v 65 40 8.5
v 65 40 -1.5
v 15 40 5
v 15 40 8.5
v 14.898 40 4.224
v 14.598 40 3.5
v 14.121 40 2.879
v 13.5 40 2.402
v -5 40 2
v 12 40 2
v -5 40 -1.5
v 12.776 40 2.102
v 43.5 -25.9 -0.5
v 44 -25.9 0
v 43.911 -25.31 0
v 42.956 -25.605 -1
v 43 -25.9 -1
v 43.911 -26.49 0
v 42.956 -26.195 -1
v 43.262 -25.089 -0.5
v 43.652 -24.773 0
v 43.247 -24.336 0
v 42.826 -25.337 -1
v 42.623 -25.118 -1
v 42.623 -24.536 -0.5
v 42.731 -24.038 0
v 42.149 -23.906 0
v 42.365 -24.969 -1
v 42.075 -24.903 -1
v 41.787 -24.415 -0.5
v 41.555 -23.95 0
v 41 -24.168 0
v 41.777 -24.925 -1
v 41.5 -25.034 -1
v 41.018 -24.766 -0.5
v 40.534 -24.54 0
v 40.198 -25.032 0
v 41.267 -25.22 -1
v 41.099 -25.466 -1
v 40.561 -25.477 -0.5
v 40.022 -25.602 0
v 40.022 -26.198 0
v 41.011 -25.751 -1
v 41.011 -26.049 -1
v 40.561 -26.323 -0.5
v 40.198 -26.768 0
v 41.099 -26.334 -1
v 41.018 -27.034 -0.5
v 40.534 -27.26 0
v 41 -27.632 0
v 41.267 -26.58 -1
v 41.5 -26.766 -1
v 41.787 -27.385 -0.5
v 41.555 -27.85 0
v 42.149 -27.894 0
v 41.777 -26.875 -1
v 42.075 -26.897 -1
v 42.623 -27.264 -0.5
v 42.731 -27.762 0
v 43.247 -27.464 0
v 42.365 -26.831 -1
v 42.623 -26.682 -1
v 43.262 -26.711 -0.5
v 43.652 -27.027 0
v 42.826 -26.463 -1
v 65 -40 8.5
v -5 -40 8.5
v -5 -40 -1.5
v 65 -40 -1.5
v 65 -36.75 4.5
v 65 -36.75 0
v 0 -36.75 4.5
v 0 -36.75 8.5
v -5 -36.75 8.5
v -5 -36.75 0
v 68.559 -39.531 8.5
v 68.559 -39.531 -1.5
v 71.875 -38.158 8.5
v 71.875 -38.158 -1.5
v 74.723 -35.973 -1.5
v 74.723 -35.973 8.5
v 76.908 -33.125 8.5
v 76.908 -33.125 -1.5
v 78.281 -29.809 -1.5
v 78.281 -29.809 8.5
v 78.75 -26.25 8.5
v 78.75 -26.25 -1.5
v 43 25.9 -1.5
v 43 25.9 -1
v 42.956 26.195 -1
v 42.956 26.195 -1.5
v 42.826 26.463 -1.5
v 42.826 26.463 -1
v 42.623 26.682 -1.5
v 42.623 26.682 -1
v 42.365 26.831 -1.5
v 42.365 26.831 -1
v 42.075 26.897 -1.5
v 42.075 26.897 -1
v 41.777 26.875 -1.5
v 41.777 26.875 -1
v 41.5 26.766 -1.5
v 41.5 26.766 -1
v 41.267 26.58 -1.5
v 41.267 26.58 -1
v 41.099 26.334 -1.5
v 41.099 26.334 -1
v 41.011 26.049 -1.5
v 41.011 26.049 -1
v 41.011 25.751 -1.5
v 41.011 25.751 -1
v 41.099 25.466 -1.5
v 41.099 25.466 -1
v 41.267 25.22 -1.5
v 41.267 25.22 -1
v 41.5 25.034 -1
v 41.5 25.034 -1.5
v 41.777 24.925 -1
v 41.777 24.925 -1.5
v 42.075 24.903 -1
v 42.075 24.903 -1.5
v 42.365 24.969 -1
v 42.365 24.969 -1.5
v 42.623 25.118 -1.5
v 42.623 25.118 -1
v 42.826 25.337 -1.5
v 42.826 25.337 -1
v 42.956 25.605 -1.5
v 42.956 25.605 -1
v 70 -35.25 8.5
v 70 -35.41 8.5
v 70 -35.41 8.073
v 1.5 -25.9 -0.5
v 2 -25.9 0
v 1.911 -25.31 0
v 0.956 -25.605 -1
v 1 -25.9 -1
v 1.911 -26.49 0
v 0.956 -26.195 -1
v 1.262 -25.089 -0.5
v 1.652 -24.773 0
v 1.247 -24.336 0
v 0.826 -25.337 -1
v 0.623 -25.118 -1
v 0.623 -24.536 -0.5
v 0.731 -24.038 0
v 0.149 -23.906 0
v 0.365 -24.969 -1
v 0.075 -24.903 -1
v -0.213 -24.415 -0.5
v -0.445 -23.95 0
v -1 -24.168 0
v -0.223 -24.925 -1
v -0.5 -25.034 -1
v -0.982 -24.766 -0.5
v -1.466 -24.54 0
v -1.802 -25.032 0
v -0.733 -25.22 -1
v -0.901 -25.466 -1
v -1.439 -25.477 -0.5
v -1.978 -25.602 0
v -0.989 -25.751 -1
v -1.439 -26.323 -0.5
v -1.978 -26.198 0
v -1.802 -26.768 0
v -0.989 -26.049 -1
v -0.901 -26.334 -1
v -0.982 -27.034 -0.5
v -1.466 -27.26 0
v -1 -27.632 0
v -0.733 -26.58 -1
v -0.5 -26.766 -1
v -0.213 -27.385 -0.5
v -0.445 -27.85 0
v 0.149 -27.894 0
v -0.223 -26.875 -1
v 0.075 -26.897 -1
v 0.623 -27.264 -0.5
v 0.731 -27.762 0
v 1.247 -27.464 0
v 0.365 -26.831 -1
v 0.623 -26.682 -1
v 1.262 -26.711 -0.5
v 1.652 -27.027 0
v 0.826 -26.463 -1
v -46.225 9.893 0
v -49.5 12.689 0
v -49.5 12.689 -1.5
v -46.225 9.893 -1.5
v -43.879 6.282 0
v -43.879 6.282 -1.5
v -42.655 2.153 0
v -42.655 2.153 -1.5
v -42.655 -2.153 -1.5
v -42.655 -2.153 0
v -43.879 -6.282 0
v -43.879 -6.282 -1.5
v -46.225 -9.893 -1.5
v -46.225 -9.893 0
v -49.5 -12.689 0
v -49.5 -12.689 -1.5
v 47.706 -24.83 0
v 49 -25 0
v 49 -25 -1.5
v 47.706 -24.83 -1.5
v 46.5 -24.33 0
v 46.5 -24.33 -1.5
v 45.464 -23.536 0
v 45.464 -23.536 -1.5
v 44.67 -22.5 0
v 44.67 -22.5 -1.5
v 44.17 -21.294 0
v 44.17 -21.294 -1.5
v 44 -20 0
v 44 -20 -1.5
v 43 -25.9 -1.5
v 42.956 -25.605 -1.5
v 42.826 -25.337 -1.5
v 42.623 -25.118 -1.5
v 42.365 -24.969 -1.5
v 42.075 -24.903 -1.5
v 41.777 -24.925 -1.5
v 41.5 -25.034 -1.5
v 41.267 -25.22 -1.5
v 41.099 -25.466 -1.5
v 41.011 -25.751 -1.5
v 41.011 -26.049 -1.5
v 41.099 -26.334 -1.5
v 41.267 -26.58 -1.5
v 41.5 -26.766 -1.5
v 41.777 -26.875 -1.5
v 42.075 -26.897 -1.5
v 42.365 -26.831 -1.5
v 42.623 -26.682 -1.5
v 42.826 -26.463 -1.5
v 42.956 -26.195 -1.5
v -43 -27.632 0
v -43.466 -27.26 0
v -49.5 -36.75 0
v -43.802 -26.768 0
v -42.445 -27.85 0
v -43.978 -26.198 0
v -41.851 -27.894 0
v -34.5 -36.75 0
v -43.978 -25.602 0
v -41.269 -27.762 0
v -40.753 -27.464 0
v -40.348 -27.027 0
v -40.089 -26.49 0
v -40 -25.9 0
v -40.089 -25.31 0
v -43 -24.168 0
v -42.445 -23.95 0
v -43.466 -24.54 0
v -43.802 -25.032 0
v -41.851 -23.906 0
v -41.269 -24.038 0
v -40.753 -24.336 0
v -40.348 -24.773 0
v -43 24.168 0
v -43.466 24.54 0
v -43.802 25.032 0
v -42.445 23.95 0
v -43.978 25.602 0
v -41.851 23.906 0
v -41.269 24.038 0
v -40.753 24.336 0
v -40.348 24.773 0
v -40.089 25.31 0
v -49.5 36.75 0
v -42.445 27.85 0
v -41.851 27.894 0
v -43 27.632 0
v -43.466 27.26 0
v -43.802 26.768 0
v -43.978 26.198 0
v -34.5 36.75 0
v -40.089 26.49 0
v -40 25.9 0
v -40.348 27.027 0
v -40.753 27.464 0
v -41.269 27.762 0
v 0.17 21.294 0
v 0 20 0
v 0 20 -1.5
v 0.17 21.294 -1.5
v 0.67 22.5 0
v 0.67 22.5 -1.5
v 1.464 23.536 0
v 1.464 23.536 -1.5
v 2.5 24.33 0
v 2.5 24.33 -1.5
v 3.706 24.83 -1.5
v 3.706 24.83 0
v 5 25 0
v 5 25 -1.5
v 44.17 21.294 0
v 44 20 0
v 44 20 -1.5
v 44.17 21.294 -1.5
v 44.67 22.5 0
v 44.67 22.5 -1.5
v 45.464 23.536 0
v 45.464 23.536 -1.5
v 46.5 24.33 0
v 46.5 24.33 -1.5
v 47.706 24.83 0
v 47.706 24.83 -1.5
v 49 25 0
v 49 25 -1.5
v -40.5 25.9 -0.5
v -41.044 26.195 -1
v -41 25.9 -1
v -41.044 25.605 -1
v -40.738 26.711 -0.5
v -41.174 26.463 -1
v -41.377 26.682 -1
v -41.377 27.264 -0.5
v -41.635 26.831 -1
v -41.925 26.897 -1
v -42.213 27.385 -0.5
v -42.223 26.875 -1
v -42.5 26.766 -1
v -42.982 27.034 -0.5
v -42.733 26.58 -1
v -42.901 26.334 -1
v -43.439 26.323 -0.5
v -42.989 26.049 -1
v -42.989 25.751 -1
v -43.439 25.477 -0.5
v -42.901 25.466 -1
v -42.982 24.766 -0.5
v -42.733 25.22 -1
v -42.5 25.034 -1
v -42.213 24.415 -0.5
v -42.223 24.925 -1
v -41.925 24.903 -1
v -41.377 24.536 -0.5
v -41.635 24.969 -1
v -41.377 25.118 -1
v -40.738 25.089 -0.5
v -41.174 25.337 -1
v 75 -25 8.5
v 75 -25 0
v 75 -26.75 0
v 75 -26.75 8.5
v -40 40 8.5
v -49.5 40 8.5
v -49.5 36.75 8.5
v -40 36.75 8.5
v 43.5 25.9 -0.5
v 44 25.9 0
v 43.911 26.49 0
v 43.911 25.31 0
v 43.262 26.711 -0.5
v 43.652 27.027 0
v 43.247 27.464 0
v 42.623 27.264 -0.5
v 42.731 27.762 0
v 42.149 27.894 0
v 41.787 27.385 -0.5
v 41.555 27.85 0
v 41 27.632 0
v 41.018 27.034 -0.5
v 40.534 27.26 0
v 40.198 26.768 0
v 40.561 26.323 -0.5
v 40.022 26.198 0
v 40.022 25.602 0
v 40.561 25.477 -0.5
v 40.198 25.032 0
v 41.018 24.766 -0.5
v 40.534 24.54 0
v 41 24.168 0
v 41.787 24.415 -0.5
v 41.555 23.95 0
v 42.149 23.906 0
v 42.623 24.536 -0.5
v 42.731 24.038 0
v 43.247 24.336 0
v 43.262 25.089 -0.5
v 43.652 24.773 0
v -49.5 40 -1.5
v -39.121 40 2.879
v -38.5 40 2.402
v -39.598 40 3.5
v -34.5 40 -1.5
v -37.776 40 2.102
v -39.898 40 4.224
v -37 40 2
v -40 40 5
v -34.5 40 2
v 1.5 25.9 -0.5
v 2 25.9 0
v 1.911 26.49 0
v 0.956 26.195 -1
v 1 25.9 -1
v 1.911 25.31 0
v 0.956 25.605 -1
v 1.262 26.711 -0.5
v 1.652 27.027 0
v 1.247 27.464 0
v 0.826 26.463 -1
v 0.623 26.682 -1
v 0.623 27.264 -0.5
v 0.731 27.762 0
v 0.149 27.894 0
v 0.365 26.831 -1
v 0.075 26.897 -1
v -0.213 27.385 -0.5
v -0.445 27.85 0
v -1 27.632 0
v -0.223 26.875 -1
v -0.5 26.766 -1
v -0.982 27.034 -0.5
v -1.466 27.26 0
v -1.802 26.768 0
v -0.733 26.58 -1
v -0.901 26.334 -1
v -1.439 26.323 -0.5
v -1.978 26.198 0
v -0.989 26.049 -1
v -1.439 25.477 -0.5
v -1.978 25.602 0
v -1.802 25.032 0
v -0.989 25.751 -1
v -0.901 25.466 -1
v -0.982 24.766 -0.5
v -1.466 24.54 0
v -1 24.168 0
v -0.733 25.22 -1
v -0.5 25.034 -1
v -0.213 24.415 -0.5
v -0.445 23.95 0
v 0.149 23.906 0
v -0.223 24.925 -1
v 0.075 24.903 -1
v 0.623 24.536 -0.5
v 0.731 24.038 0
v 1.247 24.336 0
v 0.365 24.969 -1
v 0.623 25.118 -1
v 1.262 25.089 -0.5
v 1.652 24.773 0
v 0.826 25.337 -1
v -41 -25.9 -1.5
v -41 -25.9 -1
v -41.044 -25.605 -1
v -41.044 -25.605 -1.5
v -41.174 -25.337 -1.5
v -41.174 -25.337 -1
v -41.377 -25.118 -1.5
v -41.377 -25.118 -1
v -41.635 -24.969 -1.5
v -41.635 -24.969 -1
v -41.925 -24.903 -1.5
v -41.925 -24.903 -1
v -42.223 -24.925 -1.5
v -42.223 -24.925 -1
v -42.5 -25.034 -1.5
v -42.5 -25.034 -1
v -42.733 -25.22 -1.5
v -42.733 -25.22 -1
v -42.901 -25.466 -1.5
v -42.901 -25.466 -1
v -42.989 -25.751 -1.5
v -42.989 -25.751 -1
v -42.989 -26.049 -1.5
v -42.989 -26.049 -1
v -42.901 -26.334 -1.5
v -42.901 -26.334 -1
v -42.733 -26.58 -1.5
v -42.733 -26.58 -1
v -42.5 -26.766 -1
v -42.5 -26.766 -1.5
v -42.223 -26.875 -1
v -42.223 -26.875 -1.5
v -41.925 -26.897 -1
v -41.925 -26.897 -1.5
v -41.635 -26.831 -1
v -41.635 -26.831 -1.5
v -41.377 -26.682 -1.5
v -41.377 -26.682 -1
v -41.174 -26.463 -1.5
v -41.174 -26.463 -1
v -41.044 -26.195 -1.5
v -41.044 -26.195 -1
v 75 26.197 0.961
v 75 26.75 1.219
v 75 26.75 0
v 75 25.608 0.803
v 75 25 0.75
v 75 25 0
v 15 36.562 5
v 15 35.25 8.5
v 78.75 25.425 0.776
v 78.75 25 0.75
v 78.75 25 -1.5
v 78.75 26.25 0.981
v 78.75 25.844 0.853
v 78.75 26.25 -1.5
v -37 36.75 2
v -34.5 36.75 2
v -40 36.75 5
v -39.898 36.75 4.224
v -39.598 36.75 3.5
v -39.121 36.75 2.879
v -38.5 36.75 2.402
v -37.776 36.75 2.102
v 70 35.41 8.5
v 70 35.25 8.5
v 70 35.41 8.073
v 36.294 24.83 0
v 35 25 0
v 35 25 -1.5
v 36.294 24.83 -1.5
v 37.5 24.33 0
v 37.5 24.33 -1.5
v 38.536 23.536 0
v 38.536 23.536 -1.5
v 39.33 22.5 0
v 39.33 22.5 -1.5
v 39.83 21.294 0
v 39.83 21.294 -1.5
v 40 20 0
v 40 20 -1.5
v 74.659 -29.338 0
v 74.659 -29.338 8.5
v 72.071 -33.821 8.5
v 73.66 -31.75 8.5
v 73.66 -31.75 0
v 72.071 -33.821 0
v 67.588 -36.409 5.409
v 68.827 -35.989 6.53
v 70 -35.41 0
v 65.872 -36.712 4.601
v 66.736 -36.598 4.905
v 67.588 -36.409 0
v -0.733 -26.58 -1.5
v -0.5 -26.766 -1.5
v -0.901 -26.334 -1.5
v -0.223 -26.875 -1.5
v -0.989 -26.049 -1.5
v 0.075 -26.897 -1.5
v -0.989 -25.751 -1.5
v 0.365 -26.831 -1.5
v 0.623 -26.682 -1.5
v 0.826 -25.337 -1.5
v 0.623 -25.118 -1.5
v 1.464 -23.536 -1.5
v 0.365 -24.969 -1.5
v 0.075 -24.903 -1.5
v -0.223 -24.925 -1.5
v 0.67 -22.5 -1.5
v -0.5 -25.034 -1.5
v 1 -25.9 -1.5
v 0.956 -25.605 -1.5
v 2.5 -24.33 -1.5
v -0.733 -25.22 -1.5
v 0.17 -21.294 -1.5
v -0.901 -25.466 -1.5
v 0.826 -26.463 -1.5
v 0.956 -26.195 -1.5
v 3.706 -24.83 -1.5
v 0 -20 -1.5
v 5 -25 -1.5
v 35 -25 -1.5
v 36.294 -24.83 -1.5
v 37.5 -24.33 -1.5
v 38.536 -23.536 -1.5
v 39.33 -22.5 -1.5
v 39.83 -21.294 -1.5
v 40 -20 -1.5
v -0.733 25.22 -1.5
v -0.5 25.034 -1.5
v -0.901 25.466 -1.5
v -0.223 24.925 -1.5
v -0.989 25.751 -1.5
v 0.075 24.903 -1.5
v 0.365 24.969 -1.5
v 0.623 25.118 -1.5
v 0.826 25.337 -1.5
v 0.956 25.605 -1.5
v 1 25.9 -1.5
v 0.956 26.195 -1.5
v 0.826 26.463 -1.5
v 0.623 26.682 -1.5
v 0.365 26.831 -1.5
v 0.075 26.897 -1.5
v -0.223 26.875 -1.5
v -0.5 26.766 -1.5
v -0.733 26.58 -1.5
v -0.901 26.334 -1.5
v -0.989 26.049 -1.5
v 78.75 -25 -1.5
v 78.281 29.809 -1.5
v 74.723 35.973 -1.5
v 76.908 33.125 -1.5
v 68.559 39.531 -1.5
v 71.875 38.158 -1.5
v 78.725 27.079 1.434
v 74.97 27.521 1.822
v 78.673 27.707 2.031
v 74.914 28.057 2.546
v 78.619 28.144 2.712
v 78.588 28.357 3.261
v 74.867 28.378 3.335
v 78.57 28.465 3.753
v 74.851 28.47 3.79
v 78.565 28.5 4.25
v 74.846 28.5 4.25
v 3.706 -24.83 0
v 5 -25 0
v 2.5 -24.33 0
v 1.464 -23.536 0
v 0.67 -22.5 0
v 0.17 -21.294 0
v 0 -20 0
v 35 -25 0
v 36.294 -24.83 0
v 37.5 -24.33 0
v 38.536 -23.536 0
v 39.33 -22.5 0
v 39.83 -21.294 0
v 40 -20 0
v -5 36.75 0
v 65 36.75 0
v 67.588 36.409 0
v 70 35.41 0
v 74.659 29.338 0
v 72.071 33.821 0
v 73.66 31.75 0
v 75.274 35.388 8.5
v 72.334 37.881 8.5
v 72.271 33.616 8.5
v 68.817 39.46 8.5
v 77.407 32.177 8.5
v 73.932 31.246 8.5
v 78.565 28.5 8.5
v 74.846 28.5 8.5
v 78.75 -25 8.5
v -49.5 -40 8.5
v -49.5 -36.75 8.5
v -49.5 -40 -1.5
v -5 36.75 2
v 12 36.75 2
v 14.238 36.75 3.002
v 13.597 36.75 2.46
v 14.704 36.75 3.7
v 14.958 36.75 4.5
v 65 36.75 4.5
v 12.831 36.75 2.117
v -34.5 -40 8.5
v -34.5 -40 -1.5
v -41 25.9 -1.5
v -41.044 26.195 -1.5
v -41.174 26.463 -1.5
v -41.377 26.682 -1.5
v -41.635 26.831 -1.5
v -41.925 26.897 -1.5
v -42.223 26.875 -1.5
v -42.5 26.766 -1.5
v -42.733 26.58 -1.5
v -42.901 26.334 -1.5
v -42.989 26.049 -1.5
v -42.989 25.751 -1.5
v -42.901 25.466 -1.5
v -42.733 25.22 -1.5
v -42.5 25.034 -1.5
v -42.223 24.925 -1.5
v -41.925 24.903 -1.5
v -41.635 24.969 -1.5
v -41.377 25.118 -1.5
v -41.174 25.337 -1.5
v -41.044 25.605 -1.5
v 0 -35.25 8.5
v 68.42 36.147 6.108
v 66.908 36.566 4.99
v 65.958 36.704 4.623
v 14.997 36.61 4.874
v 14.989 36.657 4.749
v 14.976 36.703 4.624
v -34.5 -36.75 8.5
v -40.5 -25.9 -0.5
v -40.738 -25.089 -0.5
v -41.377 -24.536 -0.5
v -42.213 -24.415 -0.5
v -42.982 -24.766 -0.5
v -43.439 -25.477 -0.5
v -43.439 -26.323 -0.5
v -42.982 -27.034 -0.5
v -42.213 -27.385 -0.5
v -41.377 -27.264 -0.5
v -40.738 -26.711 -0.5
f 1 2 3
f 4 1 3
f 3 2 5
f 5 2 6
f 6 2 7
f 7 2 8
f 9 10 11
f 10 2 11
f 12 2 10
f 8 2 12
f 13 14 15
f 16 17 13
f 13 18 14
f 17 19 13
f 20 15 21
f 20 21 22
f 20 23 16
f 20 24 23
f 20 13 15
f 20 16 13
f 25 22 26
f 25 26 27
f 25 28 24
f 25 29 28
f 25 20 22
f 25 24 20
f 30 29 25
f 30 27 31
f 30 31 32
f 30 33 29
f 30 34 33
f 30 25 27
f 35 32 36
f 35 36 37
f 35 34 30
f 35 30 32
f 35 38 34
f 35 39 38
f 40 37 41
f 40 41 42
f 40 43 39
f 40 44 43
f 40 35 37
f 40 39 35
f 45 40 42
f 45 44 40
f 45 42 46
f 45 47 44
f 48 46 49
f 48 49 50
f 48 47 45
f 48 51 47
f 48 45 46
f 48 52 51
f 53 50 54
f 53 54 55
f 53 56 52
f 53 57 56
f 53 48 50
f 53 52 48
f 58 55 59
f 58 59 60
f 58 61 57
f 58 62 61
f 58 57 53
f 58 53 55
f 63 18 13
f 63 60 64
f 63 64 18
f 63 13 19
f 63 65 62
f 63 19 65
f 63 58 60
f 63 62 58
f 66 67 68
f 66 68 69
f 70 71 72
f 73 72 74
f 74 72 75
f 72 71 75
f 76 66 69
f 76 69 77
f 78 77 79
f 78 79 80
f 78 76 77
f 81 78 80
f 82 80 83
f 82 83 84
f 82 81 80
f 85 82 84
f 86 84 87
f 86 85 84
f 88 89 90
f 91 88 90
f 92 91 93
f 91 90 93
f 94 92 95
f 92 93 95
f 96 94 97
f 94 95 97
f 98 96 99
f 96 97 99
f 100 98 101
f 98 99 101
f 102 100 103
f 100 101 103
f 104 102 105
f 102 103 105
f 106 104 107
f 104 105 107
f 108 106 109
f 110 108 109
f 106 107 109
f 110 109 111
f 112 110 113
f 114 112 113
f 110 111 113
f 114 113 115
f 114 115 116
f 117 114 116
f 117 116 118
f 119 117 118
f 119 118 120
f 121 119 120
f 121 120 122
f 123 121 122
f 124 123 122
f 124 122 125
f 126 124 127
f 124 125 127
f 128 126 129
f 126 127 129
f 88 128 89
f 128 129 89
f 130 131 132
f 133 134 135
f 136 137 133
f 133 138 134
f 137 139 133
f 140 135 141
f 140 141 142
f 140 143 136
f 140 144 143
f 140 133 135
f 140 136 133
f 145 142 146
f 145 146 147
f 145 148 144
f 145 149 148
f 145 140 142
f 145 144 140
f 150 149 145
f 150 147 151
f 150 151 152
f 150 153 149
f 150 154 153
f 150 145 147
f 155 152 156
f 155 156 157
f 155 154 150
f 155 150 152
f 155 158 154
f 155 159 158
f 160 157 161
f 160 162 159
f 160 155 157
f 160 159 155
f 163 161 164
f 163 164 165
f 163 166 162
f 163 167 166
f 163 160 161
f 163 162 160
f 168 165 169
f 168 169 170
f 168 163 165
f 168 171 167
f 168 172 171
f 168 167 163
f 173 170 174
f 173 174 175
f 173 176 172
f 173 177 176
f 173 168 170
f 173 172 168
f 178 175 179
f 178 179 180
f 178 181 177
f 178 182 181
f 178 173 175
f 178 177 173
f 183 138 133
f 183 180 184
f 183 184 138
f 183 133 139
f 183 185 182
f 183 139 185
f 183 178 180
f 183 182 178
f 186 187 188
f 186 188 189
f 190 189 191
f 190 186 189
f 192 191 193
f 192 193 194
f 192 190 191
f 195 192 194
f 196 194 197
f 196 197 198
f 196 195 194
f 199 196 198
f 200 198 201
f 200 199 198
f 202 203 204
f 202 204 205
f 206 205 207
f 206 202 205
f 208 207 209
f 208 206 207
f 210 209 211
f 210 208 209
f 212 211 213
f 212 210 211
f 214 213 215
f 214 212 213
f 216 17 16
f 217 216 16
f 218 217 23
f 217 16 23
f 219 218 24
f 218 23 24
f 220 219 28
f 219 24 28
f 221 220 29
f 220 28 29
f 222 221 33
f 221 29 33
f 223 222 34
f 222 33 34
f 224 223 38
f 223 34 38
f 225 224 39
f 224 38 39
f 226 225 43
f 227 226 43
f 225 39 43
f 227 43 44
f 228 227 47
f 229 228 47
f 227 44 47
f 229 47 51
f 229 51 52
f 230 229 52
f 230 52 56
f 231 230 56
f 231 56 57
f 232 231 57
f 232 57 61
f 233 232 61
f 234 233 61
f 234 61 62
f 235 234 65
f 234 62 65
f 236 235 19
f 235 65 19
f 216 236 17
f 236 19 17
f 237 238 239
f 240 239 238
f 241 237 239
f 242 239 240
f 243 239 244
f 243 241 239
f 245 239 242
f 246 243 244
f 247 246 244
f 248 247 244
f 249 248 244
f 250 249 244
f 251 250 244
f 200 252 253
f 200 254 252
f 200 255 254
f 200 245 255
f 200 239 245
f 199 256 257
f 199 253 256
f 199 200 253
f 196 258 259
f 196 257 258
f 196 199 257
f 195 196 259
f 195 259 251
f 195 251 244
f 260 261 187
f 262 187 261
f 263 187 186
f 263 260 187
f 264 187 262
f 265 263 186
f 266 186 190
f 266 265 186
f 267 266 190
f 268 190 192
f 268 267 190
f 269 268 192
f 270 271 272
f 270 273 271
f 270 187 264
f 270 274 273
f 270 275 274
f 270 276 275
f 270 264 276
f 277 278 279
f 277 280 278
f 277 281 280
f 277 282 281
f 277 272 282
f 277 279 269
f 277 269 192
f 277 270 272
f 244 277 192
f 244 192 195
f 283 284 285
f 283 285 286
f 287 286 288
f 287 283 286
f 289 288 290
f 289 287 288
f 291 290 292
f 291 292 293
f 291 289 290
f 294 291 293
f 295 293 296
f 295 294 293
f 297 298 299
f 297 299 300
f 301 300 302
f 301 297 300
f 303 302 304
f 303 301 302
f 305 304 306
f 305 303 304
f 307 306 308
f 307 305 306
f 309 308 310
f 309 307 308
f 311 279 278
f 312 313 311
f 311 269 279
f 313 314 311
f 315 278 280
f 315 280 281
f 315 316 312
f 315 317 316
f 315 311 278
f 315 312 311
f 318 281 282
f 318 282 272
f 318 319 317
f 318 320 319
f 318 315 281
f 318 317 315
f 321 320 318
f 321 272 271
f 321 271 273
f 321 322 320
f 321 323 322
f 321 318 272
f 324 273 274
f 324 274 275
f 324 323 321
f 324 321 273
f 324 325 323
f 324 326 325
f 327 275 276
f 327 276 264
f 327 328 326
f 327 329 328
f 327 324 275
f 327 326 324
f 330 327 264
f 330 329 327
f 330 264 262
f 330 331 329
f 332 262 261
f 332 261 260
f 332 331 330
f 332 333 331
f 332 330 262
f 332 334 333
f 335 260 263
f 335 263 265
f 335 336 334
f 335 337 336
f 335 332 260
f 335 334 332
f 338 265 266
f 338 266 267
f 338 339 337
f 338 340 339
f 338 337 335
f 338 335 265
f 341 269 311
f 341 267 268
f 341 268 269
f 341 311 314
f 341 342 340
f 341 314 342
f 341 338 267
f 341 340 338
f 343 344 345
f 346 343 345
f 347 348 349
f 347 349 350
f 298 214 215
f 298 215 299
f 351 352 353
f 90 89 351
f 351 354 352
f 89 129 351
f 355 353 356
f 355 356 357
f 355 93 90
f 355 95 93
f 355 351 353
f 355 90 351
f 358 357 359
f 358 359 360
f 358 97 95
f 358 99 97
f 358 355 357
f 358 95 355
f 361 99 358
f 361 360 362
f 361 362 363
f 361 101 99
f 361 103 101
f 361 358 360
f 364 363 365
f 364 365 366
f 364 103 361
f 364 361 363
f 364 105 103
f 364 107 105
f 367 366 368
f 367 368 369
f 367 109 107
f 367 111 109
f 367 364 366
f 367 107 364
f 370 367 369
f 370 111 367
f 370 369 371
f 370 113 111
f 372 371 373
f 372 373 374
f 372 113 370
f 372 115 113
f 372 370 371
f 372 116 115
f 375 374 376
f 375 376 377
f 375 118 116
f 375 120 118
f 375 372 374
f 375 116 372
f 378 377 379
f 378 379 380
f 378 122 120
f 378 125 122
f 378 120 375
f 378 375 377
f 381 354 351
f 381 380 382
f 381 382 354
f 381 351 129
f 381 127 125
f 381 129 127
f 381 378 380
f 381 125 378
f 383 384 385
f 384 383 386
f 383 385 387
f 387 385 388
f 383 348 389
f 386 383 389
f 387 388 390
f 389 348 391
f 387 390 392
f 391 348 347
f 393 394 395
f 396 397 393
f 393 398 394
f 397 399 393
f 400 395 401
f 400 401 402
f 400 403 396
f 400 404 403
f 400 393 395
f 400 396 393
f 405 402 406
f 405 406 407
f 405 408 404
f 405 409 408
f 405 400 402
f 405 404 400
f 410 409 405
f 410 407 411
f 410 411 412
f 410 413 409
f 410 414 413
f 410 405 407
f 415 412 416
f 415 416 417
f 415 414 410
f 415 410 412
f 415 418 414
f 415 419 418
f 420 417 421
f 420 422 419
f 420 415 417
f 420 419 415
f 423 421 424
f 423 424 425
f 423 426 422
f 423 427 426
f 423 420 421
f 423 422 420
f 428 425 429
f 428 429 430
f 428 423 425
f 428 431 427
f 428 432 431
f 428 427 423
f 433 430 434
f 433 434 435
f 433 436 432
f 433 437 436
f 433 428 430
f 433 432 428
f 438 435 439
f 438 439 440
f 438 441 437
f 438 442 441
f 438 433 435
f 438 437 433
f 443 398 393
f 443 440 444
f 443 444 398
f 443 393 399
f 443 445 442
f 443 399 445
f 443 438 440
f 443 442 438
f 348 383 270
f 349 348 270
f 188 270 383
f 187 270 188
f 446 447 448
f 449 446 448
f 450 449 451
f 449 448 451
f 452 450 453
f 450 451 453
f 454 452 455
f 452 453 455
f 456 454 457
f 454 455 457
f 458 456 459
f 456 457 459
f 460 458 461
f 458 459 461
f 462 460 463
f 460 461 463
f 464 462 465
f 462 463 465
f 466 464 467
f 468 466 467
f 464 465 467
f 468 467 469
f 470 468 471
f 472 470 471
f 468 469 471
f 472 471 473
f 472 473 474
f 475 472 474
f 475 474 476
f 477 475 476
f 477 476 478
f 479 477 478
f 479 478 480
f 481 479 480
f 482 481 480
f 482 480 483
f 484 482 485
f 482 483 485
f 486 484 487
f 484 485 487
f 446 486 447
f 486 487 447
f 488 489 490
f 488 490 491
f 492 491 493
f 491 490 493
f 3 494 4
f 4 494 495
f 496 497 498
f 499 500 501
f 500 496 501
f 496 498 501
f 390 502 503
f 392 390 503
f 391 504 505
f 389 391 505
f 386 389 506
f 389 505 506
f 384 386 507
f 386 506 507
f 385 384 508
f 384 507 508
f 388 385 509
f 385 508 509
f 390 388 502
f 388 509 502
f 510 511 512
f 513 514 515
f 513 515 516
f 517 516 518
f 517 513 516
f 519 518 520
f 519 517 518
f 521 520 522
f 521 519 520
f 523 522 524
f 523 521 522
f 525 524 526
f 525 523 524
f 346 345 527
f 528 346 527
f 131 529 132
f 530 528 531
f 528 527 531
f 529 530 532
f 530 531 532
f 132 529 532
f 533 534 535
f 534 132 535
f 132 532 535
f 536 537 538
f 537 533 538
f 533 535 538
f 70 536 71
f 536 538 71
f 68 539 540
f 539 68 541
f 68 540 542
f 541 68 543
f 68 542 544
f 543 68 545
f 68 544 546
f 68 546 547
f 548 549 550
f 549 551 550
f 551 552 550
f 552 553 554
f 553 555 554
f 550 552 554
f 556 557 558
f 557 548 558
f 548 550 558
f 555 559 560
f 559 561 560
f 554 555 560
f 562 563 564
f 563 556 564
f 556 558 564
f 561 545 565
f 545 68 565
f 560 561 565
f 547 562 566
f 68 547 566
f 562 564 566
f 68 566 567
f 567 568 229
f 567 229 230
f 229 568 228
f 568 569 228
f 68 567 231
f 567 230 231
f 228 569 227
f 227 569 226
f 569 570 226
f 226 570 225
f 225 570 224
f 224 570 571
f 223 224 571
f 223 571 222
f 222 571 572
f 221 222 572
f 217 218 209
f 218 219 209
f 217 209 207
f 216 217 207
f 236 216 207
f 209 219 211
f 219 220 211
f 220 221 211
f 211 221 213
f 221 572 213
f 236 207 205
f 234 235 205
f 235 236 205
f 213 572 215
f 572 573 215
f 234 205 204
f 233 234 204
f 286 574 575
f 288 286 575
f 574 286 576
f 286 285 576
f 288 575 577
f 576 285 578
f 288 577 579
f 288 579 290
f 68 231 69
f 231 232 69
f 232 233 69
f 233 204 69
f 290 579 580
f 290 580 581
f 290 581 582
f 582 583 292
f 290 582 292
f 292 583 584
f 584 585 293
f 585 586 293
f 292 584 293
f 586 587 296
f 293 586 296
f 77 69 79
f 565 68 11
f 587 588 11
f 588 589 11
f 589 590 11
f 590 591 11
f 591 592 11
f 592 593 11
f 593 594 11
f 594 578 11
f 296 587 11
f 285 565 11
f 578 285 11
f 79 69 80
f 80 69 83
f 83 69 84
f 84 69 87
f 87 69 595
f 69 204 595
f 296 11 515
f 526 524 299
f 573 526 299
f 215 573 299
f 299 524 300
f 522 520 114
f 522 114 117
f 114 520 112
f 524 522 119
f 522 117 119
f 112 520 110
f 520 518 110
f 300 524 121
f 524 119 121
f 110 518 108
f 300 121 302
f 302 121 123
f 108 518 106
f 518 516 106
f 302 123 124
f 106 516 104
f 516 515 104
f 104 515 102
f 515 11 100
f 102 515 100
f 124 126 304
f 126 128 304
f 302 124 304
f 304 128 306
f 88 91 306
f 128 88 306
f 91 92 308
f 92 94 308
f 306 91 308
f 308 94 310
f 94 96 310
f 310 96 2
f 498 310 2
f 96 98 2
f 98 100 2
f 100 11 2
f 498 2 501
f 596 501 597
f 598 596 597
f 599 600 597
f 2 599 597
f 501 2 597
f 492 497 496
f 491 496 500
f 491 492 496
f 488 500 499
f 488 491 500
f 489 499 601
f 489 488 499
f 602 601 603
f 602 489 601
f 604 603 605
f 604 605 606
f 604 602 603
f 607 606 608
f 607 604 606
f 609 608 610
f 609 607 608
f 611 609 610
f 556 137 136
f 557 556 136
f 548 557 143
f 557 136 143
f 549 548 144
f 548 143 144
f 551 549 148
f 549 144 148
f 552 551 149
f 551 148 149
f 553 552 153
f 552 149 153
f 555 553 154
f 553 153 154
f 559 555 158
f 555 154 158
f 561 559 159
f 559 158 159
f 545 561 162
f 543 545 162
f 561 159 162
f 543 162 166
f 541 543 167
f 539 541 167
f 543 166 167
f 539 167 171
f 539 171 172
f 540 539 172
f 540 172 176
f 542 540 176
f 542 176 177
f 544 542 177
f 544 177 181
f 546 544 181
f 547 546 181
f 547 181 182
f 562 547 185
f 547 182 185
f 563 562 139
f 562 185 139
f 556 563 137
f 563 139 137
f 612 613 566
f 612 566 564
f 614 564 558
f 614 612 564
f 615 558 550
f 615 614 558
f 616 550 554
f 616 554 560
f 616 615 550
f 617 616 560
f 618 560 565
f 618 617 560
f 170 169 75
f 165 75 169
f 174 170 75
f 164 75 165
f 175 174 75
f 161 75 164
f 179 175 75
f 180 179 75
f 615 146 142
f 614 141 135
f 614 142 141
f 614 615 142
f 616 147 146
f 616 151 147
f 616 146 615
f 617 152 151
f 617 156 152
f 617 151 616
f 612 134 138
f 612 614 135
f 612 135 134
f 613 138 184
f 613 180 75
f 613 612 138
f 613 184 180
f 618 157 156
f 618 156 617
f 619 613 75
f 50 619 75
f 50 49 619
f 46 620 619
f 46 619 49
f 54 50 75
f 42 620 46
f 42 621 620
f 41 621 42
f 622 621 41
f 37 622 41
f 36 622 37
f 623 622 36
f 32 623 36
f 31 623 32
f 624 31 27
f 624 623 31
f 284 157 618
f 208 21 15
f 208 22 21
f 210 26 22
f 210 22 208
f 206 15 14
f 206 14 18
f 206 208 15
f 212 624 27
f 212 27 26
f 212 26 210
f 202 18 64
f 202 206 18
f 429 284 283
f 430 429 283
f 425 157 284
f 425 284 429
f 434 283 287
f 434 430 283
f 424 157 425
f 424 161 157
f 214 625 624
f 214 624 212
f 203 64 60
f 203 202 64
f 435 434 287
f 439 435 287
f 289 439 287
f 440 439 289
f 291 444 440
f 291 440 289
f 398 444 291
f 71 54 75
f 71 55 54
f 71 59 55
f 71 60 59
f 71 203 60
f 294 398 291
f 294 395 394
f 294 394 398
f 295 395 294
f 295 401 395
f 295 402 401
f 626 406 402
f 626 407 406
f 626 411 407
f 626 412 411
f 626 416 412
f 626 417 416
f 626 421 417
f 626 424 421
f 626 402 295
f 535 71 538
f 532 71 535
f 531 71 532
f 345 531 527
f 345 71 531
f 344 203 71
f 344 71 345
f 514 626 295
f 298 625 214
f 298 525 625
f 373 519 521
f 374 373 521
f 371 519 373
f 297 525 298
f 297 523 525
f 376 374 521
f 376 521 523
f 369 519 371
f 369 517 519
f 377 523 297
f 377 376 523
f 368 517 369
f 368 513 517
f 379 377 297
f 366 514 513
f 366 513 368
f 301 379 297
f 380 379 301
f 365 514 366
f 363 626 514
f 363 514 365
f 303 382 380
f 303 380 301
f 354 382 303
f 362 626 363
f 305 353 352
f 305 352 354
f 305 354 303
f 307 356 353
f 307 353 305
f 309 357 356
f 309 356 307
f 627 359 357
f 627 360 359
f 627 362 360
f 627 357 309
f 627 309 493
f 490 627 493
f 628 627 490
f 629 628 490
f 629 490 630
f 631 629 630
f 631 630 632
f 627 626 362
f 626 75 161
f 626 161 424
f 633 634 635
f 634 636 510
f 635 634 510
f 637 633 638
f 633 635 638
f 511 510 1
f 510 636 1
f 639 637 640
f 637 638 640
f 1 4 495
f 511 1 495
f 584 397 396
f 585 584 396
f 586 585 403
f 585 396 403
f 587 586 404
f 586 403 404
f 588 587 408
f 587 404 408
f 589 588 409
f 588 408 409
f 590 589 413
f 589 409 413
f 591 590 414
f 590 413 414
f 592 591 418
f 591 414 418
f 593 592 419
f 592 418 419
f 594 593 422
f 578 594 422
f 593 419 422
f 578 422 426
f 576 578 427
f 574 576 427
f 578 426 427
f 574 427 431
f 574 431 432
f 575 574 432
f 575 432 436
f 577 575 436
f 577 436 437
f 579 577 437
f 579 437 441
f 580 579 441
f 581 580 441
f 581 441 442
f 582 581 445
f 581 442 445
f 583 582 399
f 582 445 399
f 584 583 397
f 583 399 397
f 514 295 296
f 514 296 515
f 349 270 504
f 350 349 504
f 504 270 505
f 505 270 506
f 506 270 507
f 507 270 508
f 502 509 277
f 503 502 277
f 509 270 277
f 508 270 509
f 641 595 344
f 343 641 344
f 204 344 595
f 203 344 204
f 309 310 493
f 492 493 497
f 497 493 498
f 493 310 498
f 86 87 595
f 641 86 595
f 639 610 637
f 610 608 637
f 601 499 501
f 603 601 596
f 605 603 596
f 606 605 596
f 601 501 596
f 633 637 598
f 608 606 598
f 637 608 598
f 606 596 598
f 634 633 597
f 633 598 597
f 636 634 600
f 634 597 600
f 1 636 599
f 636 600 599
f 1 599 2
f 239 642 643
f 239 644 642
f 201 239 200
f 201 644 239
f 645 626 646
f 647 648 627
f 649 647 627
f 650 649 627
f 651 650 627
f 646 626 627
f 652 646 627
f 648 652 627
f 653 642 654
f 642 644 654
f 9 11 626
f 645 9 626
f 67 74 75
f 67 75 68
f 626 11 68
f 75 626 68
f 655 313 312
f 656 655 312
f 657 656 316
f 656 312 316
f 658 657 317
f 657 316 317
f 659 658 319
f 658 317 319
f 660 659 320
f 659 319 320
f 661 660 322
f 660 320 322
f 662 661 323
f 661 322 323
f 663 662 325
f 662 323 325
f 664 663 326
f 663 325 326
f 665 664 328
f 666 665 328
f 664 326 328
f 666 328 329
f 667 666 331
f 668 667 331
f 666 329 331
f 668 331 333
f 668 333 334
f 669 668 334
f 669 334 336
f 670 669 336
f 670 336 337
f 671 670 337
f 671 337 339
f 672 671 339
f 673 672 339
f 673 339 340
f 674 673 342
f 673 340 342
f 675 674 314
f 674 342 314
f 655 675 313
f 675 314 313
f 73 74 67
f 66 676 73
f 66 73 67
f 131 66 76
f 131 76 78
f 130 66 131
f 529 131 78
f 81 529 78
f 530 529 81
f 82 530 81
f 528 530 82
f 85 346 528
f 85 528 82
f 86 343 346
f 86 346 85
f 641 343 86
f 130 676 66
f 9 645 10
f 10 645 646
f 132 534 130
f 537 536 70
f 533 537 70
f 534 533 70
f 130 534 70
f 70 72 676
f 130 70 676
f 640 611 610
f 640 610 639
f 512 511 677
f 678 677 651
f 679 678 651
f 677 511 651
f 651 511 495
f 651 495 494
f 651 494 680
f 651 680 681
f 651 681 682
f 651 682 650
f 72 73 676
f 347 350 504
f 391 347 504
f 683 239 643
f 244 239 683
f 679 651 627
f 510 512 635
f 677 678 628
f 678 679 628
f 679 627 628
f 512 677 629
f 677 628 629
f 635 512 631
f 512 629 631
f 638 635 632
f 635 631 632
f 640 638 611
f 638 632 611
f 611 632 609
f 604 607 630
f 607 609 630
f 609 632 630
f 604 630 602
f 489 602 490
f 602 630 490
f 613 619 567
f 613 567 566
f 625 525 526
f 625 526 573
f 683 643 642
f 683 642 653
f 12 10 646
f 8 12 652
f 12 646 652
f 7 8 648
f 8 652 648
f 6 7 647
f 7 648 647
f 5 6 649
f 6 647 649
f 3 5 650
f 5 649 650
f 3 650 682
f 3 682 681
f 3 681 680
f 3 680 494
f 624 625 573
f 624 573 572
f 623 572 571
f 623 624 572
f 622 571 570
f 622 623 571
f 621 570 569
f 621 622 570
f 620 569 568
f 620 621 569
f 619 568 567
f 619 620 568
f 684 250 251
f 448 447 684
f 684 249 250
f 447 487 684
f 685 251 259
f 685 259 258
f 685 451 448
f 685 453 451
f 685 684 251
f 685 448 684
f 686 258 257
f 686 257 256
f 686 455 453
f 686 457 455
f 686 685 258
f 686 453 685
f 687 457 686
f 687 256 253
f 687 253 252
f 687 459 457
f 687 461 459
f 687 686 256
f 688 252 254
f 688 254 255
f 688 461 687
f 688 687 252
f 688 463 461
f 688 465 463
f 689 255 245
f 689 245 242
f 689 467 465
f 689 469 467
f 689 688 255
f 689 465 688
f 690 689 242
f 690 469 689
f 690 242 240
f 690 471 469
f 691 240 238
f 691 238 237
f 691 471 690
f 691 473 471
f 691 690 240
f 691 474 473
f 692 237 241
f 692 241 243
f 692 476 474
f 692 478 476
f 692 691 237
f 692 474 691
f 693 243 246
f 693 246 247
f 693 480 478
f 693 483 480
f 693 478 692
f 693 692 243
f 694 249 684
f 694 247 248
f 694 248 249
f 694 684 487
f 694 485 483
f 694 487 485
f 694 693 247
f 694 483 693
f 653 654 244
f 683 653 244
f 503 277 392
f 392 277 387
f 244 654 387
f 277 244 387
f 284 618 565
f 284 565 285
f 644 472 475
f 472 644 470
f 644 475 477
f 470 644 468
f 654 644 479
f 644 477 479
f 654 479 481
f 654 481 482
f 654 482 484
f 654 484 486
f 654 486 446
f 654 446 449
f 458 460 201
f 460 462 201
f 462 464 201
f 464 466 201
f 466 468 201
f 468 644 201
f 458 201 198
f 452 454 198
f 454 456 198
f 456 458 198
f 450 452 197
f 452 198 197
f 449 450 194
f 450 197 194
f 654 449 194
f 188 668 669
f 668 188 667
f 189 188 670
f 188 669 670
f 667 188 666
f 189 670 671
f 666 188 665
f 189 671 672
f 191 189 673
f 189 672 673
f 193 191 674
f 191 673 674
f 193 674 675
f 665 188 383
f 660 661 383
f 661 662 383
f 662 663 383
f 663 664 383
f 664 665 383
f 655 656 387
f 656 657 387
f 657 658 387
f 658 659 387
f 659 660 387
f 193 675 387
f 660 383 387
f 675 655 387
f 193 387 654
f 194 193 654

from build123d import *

# Parameters (mm, degrees)
F0_R     = 1
F0_W     = 15
F0_H     = 3.25
F1_DEPTH = 1.5
F2_DEPTH = 8.5
F4_DEPTH = 70
F6_DEPTH = 78.751
F8_DEPTH = 50
F9_SIZE  = 1


with BuildPart() as f1:
    # F0 (on Top) → F1 (new body)
    with BuildSketch(Plane.XY):
        with BuildLine():
            Line((75, 25), (75, 26.75))
            ThreePointArc((75, 26.75), (72.071068, 33.821068), (65, 36.75))
            Line((65, 36.75), (25, 36.75))
            Line((25, 36.75), (0, 36.75))
            Line((0, 36.75), (-5, 36.75))
            Line((-5, 36.75), (-5, -36.75))
            Line((-5, -36.75), (0, -36.75))
            Line((0, -36.75), (25, -36.75))
            Line((25, -36.75), (65, -36.75))
            ThreePointArc((65, -36.75), (72.071068, -33.821068), (75, -26.75))
            Line((75, -26.75), (75, -25))
            Line((75, -25), (49, -25))
            ThreePointArc((49, -25), (45.464466, -23.535534), (44, -20))
            Line((44, -20), (44, 20))
            ThreePointArc((44, 20), (45.464466, 23.535534), (49, 25))
            Line((49, 25), (75, 25))
        make_face()
        with Locations((0, -25.9)):
            Circle(F0_R, mode=Mode.SUBTRACT)
        with Locations((42, -25.9)):
            Circle(F0_R, mode=Mode.SUBTRACT)
        with Locations((0, 25.9)):
            Circle(F0_R, mode=Mode.SUBTRACT)
        with BuildLine():
            ThreePointArc((40, -20), (38.535534, -23.535534), (35, -25))
            Line((35, -25), (5, -25))
            ThreePointArc((5, -25), (1.464466, -23.535534), (0, -20))
            Line((0, -20), (0, 20))
            ThreePointArc((0, 20), (1.464466, 23.535534), (5, 25))
            Line((5, 25), (35, 25))
            ThreePointArc((35, 25), (38.535534, 23.535534), (40, 20))
            Line((40, 20), (40, -20))
        make_face(mode=Mode.SUBTRACT)
        with Locations((42, 25.9)):
            Circle(F0_R, mode=Mode.SUBTRACT)
        with BuildLine():
            Line((-49.5, -36.75), (-34.5, -36.75))
            Line((-34.5, -36.75), (-34.5, 36.75))
            Line((-34.5, 36.75), (-49.5, 36.75))
            Line((-49.5, 36.75), (-49.5, 12.688578))
            ThreePointArc((-49.5, 12.688578), (-42.5, 0), (-49.5, -12.688578))
            Line((-49.5, -12.688578), (-49.5, -36.75))
        make_face()
        with Locations((-42, -25.9)):
            Circle(F0_R, mode=Mode.SUBTRACT)
        with Locations((-42, 25.9)):
            Circle(F0_R, mode=Mode.SUBTRACT)
        with Locations((-42, 38.375)):
            Rectangle(F0_W, F0_H)
        Polygon((0, 36.75), (25, 36.75), (25, 40), (-5, 40), (-5, 36.75), align=None)
        with Locations((-42, -38.375)):
            Rectangle(F0_W, F0_H)
        Polygon((25, -40), (25, -36.75), (0, -36.75), (-5, -36.75), (-5, -40), align=None)
        with BuildLine():
            Line((78.75, -25), (75, -25))
            Line((75, -25), (75, -26.75))
            ThreePointArc((75, -26.75), (72.071068, -33.821068), (65, -36.75))
            Line((65, -36.75), (25, -36.75))
            Line((25, -36.75), (25, -40))
            Line((25, -40), (65, -40))
            ThreePointArc((65, -40), (74.722718, -35.972718), (78.75, -26.25))
            Line((78.75, -26.25), (78.75, -25))
        make_face()
        with BuildLine():
            ThreePointArc((65, 36.75), (72.071068, 33.821068), (75, 26.75))
            Line((75, 26.75), (75, 25))
            Line((75, 25), (78.75, 25))
            Line((78.75, 25), (78.75, 26.25))
            ThreePointArc((78.75, 26.25), (74.722718, 35.972718), (65, 40))
            Line((65, 40), (25, 40))
            Line((25, 40), (25, 36.75))
            Line((25, 36.75), (65, 36.75))
        make_face()
    extrude(amount=-F1_DEPTH)

    # F0 (on Top) → F2 (join)
    with BuildSketch(Plane.XY):
        with BuildLine():
            ThreePointArc((65, 36.75), (72.071068, 33.821068), (75, 26.75))
            Line((75, 26.75), (75, 25))
            Line((75, 25), (78.75, 25))
            Line((78.75, 25), (78.75, 26.25))
            ThreePointArc((78.75, 26.25), (74.722718, 35.972718), (65, 40))
            Line((65, 40), (25, 40))
            Line((25, 40), (25, 36.75))
            Line((25, 36.75), (65, 36.75))
        make_face()
        with BuildLine():
            Line((78.75, -25), (75, -25))
            Line((75, -25), (75, -26.75))
            ThreePointArc((75, -26.75), (72.071068, -33.821068), (65, -36.75))
            Line((65, -36.75), (25, -36.75))
            Line((25, -36.75), (25, -40))
            Line((25, -40), (65, -40))
            ThreePointArc((65, -40), (74.722718, -35.972718), (78.75, -26.25))
            Line((78.75, -26.25), (78.75, -25))
        make_face()
        Polygon((25, -40), (25, -36.75), (0, -36.75), (-5, -36.75), (-5, -40), align=None)
        with Locations((-42, -38.375)):
            Rectangle(F0_W, F0_H)
        Polygon((0, 36.75), (25, 36.75), (25, 40), (-5, 40), (-5, 36.75), align=None)
        with Locations((-42, 38.375)):
            Rectangle(F0_W, F0_H)
    extrude(amount=F2_DEPTH)

    # F3 (on Right) → F4 (join)
    with BuildSketch(Plane.YZ):
        Polygon((36.75, 4.5), (36.75, 8.5), (35.25, 8.5), align=None)
        Polygon((-35.25, 8.5), (-36.75, 8.5), (-36.75, 4.5), align=None)
    extrude(amount=F4_DEPTH)

    # F5 (on Right) → F6 (cut, through all)
    with BuildSketch(Plane.YZ):
        with BuildLine():
            ThreePointArc((28.5, 4.25), (27.474874, 6.724874), (25, 7.75))
            Line((25, 7.75), (25, 0.75))
            ThreePointArc((25, 0.75), (27.474874, 1.775126), (28.5, 4.25))
        make_face()
        with BuildLine():
            Line((25, 8.5), (25, 7.75))
            ThreePointArc((25, 7.75), (27.474874, 6.724874), (28.5, 4.25))
            Line((28.5, 4.25), (28.5, 8.5))
            Line((28.5, 8.5), (25, 8.5))
        make_face()
    extrude(amount=F6_DEPTH, mode=Mode.SUBTRACT)

    # F7 (on Front) → F8 (cut)
    with BuildSketch(Plane.XZ):
        with BuildLine():
            Line((-37, 2), (12, 2))
            ThreePointArc((12, 2), (14.12132, 2.87868), (15, 5))
            Line((15, 5), (15, 12))
            Line((15, 12), (-40, 12))
            Line((-40, 12), (-40, 5))
            ThreePointArc((-40, 5), (-39.12132, 2.87868), (-37, 2))
        make_face()
    extrude(amount=-F8_DEPTH, mode=Mode.SUBTRACT)

    # F9
    f9_edges = [f1.edges().sort_by_distance(p)[0] for p in [
        (-43, 25.9, 0),
        (-43, -25.9, 0),
        (-1, 25.9, 0),
        (-1, -25.9, 0),
        (41, 25.9, 0),
        (41, -25.9, 0),
    ]]
    chamfer(f9_edges, length=F9_SIZE)


solid = f1.part
